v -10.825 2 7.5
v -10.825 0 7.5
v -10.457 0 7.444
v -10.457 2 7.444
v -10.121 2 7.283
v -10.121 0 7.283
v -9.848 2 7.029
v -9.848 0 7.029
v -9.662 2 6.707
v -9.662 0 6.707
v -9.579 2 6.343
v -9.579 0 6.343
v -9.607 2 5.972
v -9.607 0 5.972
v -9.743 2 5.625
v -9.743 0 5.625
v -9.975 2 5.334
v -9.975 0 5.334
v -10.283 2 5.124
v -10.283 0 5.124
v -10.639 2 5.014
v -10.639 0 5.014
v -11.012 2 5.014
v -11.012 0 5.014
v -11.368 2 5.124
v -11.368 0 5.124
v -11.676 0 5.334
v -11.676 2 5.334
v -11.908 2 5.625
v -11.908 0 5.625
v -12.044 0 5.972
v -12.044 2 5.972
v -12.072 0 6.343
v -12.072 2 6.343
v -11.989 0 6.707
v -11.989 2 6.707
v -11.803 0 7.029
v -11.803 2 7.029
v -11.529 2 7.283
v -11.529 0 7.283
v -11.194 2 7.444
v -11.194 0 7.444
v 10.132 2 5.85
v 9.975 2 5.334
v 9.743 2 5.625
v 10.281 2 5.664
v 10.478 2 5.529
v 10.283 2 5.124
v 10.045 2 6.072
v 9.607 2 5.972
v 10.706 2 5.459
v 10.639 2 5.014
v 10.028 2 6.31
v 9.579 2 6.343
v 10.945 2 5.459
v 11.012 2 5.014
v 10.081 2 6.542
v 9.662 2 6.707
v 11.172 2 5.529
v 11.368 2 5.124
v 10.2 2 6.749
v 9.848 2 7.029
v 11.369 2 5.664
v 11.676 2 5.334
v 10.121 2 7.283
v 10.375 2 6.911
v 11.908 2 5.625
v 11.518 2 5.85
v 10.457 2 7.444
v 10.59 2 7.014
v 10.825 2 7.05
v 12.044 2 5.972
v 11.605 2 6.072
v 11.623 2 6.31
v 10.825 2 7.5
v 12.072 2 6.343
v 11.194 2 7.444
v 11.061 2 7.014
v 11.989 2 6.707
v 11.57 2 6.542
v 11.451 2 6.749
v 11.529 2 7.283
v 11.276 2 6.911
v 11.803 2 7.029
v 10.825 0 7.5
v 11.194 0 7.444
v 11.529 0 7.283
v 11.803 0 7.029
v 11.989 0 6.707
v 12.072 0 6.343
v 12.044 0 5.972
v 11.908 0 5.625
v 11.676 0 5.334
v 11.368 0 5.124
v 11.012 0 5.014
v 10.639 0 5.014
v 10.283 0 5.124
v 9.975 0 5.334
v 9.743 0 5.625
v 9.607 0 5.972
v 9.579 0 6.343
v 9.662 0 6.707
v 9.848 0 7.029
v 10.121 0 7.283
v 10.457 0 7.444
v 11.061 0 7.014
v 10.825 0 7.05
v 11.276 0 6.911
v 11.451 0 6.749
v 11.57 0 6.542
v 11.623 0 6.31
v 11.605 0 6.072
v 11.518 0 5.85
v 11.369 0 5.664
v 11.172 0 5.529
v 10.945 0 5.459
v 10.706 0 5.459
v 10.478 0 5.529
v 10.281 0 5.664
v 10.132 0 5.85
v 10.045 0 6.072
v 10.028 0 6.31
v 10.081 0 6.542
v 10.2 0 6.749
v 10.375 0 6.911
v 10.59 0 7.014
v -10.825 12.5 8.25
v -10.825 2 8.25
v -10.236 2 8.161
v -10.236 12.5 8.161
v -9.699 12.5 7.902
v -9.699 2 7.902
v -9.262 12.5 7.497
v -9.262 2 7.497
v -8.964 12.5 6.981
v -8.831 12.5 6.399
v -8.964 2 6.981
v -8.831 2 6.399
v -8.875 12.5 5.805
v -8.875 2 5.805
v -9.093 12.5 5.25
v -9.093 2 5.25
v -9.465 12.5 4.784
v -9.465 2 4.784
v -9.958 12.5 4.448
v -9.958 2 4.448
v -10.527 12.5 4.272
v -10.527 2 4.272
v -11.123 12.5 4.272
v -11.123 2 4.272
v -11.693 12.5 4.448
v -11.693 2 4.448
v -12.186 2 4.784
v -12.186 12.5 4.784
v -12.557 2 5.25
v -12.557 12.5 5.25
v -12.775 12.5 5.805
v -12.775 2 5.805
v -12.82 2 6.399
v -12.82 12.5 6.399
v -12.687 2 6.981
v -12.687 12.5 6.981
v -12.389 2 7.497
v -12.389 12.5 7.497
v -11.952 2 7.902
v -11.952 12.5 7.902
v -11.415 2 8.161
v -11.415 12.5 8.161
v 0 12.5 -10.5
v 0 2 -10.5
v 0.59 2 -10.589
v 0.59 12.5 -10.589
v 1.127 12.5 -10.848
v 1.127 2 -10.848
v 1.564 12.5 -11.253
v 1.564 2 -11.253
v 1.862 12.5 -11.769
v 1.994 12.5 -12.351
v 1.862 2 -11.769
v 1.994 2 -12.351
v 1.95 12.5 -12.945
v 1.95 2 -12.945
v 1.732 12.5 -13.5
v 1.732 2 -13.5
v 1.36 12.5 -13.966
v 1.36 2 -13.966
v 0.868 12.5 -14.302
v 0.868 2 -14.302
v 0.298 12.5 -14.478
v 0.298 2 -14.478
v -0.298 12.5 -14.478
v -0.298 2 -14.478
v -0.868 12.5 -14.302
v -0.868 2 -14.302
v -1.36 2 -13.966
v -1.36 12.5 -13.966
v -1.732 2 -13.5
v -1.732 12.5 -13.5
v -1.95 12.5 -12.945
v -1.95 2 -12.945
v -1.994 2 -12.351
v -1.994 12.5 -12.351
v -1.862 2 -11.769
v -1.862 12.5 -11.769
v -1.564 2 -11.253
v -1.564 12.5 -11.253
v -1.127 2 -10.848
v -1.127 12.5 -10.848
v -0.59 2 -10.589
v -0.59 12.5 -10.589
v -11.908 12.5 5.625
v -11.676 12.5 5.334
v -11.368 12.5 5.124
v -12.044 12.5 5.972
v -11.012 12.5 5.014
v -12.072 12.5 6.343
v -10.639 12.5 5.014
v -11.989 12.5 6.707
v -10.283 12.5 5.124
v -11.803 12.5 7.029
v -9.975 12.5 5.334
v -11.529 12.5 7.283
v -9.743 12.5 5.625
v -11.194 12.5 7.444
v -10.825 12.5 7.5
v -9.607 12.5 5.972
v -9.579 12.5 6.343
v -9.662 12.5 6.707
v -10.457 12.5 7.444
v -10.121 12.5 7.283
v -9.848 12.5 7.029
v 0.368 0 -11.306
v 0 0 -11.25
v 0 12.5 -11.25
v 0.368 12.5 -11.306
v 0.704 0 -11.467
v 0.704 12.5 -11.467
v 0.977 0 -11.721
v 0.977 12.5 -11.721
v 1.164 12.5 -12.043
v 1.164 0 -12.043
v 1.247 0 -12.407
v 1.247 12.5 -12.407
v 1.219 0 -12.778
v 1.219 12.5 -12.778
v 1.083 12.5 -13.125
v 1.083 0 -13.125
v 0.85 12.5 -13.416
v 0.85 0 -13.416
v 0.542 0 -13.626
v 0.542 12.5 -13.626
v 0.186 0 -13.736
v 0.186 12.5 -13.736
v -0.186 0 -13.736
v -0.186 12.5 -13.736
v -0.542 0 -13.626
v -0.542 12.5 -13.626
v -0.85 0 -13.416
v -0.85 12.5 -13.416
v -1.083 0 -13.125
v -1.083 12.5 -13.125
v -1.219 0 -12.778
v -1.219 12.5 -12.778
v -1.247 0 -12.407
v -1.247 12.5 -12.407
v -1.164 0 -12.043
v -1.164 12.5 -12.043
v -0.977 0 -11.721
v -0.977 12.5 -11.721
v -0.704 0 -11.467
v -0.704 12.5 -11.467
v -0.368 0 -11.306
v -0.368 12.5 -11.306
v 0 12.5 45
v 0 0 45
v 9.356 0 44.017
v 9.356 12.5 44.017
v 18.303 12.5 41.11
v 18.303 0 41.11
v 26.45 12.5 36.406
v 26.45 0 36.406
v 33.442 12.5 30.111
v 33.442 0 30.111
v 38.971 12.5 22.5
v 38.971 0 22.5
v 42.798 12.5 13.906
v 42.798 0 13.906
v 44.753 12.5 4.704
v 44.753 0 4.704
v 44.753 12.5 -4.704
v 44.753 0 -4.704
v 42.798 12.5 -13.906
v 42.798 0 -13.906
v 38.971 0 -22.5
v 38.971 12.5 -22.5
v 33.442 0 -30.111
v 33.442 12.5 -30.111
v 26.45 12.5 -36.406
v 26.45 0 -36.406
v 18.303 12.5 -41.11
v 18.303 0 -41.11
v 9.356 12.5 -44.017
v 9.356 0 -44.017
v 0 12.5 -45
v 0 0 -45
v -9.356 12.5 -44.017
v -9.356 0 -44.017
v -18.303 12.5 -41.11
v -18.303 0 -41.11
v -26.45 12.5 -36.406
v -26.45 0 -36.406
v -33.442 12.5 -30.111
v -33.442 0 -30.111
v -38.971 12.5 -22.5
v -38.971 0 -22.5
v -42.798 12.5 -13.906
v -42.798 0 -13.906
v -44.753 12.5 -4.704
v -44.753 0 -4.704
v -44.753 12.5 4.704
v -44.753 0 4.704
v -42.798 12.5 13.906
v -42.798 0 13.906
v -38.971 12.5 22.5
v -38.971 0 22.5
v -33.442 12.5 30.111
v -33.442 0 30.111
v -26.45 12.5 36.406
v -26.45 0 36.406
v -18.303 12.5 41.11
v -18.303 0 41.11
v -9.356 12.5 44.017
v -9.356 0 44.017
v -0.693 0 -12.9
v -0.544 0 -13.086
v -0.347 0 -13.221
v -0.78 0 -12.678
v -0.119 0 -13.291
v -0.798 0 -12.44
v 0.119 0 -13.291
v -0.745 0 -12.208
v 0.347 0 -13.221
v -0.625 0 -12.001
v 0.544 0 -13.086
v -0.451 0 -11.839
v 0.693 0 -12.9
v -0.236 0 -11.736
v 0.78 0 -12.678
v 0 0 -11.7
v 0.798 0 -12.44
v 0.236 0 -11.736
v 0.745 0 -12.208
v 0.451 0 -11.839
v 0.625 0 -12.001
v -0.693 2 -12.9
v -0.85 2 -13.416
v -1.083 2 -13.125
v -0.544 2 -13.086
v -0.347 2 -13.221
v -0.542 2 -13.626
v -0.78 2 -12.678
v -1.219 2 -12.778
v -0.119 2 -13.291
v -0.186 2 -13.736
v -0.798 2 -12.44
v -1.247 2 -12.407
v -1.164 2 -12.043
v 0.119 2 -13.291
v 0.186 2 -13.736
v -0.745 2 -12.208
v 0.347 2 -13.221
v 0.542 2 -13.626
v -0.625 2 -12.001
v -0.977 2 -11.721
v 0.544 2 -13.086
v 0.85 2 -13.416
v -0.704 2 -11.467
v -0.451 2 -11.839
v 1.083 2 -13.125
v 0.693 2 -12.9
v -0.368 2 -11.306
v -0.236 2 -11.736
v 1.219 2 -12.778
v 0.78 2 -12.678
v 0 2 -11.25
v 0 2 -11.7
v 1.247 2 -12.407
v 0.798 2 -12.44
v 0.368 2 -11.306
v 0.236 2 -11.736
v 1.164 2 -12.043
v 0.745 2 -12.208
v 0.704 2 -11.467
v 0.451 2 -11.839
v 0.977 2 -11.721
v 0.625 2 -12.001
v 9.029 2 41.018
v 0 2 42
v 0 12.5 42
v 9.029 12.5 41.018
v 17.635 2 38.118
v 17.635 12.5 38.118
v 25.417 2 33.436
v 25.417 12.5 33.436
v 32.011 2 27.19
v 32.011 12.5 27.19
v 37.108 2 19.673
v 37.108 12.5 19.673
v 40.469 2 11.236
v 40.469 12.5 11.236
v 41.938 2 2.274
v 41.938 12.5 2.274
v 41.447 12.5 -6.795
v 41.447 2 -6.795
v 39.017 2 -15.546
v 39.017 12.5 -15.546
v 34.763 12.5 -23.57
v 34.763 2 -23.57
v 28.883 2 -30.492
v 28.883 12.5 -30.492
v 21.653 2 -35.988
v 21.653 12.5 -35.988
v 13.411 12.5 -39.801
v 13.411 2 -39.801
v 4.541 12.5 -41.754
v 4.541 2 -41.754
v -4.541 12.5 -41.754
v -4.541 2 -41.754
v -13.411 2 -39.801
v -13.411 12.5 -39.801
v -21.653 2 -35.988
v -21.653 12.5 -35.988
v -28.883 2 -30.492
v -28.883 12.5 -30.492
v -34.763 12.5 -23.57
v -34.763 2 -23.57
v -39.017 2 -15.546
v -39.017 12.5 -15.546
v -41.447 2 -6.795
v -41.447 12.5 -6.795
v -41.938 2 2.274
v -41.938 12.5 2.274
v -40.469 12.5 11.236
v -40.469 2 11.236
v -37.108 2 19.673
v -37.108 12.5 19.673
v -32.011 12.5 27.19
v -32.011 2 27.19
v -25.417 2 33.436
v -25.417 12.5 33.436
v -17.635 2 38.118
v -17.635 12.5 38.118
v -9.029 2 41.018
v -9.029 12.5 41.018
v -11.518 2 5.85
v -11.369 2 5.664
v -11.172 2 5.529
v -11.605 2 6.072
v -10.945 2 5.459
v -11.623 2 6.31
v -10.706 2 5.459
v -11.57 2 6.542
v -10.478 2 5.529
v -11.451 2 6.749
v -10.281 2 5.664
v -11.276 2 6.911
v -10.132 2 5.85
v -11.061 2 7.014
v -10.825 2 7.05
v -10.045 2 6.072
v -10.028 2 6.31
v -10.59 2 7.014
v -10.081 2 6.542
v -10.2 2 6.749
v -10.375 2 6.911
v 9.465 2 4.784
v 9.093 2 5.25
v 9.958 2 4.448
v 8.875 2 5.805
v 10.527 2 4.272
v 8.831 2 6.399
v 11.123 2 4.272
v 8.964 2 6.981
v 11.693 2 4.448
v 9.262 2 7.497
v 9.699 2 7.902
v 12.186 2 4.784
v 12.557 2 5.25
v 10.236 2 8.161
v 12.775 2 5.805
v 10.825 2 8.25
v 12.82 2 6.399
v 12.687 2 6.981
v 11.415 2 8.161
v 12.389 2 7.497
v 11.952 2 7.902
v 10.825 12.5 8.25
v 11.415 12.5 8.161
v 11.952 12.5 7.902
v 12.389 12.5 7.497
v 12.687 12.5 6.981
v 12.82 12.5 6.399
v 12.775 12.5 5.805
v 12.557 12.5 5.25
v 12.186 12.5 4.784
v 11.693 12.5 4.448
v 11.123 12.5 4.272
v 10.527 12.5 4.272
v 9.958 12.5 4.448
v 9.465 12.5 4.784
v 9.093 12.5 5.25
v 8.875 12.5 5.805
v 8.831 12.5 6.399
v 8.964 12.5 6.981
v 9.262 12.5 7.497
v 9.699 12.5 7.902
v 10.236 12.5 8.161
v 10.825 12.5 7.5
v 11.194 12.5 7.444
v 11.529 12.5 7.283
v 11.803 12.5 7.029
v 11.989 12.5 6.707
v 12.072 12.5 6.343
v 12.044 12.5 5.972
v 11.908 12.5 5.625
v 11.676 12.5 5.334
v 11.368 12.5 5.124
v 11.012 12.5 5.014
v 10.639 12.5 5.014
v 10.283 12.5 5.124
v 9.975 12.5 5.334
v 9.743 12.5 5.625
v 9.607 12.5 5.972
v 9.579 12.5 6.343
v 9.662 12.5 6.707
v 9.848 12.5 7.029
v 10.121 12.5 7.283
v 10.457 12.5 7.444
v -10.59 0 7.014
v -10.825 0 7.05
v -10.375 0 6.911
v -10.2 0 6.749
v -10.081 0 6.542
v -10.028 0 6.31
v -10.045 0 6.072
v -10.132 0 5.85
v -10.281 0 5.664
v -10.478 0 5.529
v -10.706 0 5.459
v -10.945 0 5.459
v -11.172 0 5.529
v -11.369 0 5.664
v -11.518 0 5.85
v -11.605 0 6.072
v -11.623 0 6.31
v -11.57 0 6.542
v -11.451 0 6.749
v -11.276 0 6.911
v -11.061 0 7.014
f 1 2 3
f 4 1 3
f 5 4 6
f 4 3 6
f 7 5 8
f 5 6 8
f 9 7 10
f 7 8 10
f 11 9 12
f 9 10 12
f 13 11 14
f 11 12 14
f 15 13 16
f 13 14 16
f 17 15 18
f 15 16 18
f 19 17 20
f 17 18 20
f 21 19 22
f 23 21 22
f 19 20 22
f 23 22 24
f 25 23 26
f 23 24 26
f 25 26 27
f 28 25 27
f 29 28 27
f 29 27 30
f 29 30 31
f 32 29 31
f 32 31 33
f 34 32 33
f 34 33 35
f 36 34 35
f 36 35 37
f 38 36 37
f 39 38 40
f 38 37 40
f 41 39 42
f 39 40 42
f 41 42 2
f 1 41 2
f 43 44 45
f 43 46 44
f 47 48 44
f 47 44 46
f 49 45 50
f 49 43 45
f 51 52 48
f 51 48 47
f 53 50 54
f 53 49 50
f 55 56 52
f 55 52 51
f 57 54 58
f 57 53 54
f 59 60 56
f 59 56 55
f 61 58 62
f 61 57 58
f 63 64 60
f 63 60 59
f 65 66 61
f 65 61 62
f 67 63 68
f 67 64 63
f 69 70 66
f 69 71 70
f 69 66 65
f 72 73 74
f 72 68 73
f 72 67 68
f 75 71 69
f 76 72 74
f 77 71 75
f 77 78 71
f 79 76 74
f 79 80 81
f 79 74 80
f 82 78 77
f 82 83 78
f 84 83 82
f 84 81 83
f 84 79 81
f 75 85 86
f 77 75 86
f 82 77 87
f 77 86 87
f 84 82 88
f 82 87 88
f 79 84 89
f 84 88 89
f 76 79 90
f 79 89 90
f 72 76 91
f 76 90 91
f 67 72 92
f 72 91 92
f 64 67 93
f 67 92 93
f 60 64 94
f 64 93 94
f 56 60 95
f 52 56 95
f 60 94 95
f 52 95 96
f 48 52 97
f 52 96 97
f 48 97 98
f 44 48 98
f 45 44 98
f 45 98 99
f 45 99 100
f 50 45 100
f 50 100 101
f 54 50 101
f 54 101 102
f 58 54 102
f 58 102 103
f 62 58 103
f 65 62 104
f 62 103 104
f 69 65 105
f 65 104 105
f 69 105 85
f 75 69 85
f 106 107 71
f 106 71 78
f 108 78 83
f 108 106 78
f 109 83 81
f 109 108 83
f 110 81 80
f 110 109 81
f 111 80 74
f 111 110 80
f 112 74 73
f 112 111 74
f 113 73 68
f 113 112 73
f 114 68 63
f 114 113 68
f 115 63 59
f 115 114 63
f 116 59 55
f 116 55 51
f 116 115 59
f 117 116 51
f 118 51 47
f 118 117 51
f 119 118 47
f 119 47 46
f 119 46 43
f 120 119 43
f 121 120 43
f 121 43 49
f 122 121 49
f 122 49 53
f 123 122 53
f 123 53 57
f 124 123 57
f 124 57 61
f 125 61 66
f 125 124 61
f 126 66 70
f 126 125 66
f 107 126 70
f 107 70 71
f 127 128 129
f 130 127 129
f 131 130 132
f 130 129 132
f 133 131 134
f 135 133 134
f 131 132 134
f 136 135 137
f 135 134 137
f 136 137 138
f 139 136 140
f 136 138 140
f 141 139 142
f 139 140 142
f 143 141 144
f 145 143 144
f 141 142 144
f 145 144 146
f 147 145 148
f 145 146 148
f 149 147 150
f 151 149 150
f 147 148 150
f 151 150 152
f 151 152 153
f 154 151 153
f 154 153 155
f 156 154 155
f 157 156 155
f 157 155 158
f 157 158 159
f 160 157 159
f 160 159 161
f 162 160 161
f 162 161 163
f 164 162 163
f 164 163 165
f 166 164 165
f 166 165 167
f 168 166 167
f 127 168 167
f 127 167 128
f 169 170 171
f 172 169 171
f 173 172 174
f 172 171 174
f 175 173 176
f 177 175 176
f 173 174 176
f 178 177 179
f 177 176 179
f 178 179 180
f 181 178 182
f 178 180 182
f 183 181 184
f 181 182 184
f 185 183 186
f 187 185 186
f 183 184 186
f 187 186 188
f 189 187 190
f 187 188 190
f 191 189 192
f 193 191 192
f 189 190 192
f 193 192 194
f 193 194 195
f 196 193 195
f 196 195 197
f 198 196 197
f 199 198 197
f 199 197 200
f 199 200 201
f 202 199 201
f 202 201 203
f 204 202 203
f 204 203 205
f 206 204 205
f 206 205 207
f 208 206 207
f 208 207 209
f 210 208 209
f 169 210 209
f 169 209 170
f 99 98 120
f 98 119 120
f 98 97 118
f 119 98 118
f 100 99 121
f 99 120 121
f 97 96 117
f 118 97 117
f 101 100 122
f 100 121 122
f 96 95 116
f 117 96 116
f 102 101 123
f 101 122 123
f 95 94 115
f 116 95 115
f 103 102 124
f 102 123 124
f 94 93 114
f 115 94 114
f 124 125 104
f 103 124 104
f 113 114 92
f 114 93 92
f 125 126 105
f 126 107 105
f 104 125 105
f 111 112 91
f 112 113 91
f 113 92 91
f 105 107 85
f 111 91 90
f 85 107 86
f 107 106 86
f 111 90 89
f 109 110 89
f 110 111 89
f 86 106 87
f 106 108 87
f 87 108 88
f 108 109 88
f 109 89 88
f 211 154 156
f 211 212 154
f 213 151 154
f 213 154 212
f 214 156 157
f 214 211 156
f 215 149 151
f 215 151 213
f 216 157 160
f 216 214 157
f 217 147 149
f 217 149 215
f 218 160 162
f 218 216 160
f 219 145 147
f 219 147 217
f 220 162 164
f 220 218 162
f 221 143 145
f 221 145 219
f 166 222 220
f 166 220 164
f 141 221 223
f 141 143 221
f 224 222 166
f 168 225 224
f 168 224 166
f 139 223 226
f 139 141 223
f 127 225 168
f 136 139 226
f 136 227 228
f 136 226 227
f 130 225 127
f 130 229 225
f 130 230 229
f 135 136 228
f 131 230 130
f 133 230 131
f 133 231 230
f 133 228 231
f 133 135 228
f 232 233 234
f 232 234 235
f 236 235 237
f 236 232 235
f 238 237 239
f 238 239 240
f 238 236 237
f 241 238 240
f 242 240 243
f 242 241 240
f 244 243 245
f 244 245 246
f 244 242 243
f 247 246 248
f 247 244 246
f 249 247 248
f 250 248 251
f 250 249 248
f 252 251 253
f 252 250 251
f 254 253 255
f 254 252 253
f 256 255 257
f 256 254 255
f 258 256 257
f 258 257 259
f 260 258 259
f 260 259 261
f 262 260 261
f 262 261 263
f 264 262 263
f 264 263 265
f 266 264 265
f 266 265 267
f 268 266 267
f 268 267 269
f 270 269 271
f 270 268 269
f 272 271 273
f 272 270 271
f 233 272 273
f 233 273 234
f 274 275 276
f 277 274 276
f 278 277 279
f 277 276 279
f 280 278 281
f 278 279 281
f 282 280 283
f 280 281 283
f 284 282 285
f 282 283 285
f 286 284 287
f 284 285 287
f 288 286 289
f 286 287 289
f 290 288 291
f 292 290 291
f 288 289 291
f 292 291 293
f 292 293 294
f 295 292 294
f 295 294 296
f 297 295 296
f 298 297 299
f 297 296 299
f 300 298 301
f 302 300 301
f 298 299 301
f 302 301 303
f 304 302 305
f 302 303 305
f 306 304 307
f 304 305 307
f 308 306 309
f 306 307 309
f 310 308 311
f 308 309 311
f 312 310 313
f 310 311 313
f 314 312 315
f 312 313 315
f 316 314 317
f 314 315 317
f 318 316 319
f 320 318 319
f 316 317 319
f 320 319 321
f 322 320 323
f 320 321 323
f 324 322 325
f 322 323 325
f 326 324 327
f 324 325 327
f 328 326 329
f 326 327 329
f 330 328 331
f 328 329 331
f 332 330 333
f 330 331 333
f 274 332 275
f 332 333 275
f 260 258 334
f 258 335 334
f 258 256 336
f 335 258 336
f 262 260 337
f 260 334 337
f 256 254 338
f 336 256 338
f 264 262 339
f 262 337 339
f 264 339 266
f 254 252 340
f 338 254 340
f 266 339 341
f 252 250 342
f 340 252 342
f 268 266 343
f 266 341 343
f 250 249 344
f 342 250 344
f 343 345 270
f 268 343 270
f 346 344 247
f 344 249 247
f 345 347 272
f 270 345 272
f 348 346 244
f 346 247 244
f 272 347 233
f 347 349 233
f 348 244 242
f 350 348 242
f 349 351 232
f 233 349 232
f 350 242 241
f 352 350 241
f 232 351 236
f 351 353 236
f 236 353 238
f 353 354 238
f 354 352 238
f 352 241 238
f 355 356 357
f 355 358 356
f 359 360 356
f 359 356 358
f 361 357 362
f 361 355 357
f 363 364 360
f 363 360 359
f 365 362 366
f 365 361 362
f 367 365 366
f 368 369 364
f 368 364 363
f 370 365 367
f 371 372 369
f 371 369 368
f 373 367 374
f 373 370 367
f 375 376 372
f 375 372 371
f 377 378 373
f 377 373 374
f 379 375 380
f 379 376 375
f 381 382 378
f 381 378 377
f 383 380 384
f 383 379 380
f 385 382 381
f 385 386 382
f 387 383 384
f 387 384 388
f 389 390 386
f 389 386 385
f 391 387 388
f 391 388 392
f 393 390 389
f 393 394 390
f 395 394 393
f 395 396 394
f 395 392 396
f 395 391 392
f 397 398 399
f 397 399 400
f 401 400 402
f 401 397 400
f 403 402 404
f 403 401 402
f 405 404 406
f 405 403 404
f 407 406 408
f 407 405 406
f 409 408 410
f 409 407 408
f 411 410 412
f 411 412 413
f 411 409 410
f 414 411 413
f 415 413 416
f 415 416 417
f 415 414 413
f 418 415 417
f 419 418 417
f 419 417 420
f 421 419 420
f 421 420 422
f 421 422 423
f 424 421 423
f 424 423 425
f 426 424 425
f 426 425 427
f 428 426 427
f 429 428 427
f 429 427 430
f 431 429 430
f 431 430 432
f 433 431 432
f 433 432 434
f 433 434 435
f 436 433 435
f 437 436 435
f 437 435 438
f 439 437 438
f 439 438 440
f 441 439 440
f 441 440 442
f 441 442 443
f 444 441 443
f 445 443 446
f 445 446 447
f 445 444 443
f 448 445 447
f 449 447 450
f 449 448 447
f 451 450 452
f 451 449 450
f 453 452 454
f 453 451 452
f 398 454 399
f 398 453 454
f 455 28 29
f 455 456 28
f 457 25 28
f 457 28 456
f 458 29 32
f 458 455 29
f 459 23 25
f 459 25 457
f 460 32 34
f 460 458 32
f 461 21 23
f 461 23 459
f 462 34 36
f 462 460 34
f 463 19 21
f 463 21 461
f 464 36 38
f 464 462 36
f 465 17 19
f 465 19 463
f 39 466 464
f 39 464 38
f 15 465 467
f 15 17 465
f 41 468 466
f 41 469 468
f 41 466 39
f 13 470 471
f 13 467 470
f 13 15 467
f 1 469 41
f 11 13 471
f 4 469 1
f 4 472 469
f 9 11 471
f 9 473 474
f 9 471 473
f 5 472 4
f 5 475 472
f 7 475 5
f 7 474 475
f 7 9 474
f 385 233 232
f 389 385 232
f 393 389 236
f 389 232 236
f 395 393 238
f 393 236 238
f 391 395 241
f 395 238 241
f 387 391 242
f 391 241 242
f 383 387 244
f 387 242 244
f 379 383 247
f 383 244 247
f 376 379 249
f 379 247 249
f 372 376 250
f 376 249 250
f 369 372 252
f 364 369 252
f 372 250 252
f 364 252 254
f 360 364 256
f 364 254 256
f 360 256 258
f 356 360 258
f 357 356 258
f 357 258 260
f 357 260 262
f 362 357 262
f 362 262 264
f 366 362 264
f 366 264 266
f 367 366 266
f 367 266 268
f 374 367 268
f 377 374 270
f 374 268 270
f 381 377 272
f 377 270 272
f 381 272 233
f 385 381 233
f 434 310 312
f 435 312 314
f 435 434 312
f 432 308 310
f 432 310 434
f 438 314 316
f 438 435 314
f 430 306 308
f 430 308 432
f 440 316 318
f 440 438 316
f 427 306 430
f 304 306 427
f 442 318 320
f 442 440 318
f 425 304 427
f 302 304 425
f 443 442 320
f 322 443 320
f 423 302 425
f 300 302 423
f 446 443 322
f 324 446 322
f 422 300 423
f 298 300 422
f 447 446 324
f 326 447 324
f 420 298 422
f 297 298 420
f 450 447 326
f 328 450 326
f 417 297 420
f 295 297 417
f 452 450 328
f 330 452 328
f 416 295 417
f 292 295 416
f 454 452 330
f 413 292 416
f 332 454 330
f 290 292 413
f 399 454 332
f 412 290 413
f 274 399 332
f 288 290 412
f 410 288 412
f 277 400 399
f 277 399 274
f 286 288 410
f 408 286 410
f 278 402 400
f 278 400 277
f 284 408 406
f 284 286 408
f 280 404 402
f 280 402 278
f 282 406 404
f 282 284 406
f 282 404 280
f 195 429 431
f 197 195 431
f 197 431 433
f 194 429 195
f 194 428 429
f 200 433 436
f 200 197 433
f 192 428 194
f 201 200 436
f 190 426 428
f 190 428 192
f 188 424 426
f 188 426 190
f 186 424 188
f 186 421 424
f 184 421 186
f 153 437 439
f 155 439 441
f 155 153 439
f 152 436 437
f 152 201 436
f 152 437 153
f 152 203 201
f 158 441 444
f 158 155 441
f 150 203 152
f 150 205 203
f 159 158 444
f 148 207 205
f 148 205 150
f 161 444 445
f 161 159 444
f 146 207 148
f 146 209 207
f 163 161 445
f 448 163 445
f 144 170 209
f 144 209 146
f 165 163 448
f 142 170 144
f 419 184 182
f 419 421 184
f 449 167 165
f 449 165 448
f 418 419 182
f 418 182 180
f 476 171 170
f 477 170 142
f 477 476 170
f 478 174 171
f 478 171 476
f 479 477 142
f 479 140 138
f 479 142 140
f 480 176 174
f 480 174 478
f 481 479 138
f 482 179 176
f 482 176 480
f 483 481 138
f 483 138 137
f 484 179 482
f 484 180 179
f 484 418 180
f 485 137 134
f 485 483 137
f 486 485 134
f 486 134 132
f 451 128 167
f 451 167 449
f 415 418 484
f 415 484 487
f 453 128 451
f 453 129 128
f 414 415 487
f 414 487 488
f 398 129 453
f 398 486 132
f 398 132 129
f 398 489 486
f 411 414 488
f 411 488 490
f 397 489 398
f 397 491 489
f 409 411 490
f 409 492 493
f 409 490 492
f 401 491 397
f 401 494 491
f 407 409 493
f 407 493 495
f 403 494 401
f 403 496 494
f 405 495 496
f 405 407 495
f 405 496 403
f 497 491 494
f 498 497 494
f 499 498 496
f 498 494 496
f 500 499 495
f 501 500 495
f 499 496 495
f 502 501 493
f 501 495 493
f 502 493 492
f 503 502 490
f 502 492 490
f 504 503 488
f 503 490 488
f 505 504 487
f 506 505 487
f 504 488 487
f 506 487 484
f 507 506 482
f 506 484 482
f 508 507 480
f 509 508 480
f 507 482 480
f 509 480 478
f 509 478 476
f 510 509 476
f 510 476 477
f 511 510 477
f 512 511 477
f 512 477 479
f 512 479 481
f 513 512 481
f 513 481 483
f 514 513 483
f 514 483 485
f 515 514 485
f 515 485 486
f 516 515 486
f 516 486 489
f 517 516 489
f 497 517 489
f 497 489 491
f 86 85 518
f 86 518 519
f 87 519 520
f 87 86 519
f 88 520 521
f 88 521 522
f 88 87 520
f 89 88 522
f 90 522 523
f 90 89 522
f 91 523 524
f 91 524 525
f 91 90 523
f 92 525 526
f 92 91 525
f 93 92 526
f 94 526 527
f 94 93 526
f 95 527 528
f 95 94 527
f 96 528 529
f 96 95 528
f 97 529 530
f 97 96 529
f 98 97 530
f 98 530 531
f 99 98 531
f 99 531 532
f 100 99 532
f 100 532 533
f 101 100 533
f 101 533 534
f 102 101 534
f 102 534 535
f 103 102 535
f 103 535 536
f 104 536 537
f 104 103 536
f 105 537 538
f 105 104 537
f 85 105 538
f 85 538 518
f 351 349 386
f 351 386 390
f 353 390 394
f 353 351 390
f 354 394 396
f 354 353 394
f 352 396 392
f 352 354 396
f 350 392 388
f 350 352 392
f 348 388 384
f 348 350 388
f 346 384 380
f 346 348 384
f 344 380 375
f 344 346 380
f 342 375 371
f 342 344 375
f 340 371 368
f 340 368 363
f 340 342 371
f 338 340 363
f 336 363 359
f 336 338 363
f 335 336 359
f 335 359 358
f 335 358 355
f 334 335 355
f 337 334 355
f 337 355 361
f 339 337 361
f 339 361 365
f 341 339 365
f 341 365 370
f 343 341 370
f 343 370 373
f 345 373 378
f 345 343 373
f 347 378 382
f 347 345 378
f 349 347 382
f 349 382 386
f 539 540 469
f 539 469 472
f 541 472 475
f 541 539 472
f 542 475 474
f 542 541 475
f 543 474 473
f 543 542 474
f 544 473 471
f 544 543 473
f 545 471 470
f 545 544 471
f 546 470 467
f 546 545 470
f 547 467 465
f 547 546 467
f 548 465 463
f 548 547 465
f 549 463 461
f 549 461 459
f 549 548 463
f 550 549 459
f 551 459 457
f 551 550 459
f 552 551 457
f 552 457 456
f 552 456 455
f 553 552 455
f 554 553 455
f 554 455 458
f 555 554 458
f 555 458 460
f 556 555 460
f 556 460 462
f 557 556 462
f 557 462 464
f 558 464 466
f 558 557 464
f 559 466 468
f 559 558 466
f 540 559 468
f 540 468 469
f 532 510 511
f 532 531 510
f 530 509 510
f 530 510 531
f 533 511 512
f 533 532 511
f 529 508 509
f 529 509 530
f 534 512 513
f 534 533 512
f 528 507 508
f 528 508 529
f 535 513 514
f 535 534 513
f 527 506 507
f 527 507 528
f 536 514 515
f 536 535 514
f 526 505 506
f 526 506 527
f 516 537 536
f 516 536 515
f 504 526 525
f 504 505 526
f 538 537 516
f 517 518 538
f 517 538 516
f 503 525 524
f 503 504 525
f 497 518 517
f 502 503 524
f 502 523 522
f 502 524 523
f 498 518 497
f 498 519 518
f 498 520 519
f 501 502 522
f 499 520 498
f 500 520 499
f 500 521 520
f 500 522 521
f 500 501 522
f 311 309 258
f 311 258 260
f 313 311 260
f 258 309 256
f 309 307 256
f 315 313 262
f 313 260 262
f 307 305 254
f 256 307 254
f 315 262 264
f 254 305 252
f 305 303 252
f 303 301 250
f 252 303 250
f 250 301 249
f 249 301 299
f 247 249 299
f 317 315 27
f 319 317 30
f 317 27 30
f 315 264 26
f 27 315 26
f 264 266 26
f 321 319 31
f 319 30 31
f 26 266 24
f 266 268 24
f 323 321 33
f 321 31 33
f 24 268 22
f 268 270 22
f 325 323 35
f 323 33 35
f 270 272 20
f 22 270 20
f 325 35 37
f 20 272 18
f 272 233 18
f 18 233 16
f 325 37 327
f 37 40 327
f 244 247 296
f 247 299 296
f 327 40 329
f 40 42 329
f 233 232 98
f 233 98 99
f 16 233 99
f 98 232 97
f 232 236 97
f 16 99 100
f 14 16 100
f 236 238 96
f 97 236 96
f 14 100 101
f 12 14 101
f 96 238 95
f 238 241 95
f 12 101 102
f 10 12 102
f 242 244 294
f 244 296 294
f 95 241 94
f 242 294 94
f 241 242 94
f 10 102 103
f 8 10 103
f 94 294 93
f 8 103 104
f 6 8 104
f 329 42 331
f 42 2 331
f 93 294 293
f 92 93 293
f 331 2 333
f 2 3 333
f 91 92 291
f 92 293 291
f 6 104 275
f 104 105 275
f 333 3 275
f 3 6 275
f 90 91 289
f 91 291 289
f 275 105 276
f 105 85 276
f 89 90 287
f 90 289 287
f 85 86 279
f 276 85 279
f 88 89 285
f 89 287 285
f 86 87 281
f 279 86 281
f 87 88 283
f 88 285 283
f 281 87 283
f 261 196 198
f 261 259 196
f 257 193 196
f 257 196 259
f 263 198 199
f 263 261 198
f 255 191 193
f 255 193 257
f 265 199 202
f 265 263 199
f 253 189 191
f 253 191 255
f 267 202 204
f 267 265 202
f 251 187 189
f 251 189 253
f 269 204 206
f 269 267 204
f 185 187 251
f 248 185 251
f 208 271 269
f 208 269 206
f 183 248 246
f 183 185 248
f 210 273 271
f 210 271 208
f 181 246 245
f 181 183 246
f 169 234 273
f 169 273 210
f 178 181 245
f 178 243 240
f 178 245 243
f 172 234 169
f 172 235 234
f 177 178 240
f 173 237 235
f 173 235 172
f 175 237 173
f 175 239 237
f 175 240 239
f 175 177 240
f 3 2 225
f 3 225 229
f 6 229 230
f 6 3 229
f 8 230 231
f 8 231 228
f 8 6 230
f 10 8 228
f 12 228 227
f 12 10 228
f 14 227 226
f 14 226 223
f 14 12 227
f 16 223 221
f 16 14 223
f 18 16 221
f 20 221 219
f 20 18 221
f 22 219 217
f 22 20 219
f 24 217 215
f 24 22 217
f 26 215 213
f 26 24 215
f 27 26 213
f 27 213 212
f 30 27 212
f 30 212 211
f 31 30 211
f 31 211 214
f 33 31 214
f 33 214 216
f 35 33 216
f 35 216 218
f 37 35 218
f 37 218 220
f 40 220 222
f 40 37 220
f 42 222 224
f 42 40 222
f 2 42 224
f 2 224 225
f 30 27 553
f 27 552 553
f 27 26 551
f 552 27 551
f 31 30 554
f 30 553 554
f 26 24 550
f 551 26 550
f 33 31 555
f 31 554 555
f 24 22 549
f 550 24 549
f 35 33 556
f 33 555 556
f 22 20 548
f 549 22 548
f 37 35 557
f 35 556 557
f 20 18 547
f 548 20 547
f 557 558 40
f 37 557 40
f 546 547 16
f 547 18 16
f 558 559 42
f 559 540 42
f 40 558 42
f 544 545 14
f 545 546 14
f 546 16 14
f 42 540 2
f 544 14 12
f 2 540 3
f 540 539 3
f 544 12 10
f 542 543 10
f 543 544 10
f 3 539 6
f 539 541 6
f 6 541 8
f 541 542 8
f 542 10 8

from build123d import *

# Parameters (mm, degrees)
SKETCH1_R             = 42
SKETCH1_R_2           = 2
BOSS_EXTRUDE1_DEPTH   = 2
SKETCH1_R_3           = 1.25
SKETCH1_R_4           = 0.8
BOSS_EXTRUDE1_2_DEPTH = 2
BOSS_EXTRUDE1_3_DEPTH = 2
BOSS_EXTRUDE1_4_DEPTH = 2
SKETCH1_3_R           = 45
SKETCH1_3_R_2         = 42
SKETCH1_3_R_3         = 2
SKETCH1_3_R_4         = 1.25
BOSS_EXTRUDE2_DEPTH   = 12.5


with BuildPart() as part:
    # Sketch1 → Boss-Extrude1 (new body)
    with BuildSketch(Plane(origin=(0, 0, 0), x_dir=(1, 0, 0), z_dir=(0, 1, 0))):
        Circle(SKETCH1_R)
        with Locations((-10.825317547, -6.25)):
            Circle(SKETCH1_R_2, mode=Mode.SUBTRACT)
        with Locations((10.825317547, -6.25)):
            Circle(SKETCH1_R_2, mode=Mode.SUBTRACT)
        with Locations((0, 12.5)):
            Circle(SKETCH1_R_2, mode=Mode.SUBTRACT)
    extrude(amount=BOSS_EXTRUDE1_DEPTH)

    # Sketch1<3> → Boss-Extrude2 (add)
    # profile 1 of 4: a face of its own
    with BuildSketch(Plane(origin=(0, 0, 0), x_dir=(1, 0, 0), z_dir=(0, 1, 0))):
        Circle(SKETCH1_3_R)
        Circle(SKETCH1_3_R_2, mode=Mode.SUBTRACT)
    # profile 2 of 4: a face of its own
    with BuildSketch(Plane(origin=(0, 0, 0), x_dir=(1, 0, 0), z_dir=(0, 1, 0))):
        with Locations((-10.825317547, -6.25)):
            Circle(SKETCH1_3_R_3)
        with Locations((-10.825317547, -6.25)):
            Circle(SKETCH1_3_R_4, mode=Mode.SUBTRACT)
    # profile 3 of 4: a face of its own
    with BuildSketch(Plane(origin=(0, 0, 0), x_dir=(1, 0, 0), z_dir=(0, 1, 0))):
        with Locations((10.825317547, -6.25)):
            Circle(SKETCH1_3_R_3)
        with Locations((10.825317547, -6.25)):
            Circle(SKETCH1_3_R_4, mode=Mode.SUBTRACT)
    # profile 4 of 4: a face of its own
    with BuildSketch(Plane(origin=(0, 0, 0), x_dir=(1, 0, 0), z_dir=(0, 1, 0))):
        with Locations((0, 12.5)):
            Circle(SKETCH1_3_R_3)
        with Locations((0, 12.5)):
            Circle(SKETCH1_3_R_4, mode=Mode.SUBTRACT)
    extrude(amount=BOSS_EXTRUDE2_DEPTH)


with BuildPart() as body_2:
    # Sketch1 → Boss-Extrude1 2 (new body)
    with BuildSketch(Plane(origin=(0, 0, 0), x_dir=(1, 0, 0), z_dir=(0, 1, 0))):
        with Locations((0, 12.5)):
            Circle(SKETCH1_R_3)
        with Locations((0, 12.5)):
            Circle(SKETCH1_R_4, mode=Mode.SUBTRACT)
    extrude(amount=BOSS_EXTRUDE1_2_DEPTH)


with BuildPart() as body_3:
    # Sketch1 → Boss-Extrude1 3 (new body)
    with BuildSketch(Plane(origin=(0, 0, 0), x_dir=(1, 0, 0), z_dir=(0, 1, 0))):
        with Locations((10.825317547, -6.25)):
            Circle(SKETCH1_R_3)
        with Locations((10.825317547, -6.25)):
            Circle(SKETCH1_R_4, mode=Mode.SUBTRACT)
    extrude(amount=BOSS_EXTRUDE1_3_DEPTH)


with BuildPart() as body_4:
    # Sketch1 → Boss-Extrude1 4 (new body)
    with BuildSketch(Plane(origin=(0, 0, 0), x_dir=(1, 0, 0), z_dir=(0, 1, 0))):
        with Locations((-10.825317547, -6.25)):
            Circle(SKETCH1_R_3)
        with Locations((-10.825317547, -6.25)):
            Circle(SKETCH1_R_4, mode=Mode.SUBTRACT)
    extrude(amount=BOSS_EXTRUDE1_4_DEPTH)


solid = Compound([part.part, body_2.part, body_3.part, body_4.part])
